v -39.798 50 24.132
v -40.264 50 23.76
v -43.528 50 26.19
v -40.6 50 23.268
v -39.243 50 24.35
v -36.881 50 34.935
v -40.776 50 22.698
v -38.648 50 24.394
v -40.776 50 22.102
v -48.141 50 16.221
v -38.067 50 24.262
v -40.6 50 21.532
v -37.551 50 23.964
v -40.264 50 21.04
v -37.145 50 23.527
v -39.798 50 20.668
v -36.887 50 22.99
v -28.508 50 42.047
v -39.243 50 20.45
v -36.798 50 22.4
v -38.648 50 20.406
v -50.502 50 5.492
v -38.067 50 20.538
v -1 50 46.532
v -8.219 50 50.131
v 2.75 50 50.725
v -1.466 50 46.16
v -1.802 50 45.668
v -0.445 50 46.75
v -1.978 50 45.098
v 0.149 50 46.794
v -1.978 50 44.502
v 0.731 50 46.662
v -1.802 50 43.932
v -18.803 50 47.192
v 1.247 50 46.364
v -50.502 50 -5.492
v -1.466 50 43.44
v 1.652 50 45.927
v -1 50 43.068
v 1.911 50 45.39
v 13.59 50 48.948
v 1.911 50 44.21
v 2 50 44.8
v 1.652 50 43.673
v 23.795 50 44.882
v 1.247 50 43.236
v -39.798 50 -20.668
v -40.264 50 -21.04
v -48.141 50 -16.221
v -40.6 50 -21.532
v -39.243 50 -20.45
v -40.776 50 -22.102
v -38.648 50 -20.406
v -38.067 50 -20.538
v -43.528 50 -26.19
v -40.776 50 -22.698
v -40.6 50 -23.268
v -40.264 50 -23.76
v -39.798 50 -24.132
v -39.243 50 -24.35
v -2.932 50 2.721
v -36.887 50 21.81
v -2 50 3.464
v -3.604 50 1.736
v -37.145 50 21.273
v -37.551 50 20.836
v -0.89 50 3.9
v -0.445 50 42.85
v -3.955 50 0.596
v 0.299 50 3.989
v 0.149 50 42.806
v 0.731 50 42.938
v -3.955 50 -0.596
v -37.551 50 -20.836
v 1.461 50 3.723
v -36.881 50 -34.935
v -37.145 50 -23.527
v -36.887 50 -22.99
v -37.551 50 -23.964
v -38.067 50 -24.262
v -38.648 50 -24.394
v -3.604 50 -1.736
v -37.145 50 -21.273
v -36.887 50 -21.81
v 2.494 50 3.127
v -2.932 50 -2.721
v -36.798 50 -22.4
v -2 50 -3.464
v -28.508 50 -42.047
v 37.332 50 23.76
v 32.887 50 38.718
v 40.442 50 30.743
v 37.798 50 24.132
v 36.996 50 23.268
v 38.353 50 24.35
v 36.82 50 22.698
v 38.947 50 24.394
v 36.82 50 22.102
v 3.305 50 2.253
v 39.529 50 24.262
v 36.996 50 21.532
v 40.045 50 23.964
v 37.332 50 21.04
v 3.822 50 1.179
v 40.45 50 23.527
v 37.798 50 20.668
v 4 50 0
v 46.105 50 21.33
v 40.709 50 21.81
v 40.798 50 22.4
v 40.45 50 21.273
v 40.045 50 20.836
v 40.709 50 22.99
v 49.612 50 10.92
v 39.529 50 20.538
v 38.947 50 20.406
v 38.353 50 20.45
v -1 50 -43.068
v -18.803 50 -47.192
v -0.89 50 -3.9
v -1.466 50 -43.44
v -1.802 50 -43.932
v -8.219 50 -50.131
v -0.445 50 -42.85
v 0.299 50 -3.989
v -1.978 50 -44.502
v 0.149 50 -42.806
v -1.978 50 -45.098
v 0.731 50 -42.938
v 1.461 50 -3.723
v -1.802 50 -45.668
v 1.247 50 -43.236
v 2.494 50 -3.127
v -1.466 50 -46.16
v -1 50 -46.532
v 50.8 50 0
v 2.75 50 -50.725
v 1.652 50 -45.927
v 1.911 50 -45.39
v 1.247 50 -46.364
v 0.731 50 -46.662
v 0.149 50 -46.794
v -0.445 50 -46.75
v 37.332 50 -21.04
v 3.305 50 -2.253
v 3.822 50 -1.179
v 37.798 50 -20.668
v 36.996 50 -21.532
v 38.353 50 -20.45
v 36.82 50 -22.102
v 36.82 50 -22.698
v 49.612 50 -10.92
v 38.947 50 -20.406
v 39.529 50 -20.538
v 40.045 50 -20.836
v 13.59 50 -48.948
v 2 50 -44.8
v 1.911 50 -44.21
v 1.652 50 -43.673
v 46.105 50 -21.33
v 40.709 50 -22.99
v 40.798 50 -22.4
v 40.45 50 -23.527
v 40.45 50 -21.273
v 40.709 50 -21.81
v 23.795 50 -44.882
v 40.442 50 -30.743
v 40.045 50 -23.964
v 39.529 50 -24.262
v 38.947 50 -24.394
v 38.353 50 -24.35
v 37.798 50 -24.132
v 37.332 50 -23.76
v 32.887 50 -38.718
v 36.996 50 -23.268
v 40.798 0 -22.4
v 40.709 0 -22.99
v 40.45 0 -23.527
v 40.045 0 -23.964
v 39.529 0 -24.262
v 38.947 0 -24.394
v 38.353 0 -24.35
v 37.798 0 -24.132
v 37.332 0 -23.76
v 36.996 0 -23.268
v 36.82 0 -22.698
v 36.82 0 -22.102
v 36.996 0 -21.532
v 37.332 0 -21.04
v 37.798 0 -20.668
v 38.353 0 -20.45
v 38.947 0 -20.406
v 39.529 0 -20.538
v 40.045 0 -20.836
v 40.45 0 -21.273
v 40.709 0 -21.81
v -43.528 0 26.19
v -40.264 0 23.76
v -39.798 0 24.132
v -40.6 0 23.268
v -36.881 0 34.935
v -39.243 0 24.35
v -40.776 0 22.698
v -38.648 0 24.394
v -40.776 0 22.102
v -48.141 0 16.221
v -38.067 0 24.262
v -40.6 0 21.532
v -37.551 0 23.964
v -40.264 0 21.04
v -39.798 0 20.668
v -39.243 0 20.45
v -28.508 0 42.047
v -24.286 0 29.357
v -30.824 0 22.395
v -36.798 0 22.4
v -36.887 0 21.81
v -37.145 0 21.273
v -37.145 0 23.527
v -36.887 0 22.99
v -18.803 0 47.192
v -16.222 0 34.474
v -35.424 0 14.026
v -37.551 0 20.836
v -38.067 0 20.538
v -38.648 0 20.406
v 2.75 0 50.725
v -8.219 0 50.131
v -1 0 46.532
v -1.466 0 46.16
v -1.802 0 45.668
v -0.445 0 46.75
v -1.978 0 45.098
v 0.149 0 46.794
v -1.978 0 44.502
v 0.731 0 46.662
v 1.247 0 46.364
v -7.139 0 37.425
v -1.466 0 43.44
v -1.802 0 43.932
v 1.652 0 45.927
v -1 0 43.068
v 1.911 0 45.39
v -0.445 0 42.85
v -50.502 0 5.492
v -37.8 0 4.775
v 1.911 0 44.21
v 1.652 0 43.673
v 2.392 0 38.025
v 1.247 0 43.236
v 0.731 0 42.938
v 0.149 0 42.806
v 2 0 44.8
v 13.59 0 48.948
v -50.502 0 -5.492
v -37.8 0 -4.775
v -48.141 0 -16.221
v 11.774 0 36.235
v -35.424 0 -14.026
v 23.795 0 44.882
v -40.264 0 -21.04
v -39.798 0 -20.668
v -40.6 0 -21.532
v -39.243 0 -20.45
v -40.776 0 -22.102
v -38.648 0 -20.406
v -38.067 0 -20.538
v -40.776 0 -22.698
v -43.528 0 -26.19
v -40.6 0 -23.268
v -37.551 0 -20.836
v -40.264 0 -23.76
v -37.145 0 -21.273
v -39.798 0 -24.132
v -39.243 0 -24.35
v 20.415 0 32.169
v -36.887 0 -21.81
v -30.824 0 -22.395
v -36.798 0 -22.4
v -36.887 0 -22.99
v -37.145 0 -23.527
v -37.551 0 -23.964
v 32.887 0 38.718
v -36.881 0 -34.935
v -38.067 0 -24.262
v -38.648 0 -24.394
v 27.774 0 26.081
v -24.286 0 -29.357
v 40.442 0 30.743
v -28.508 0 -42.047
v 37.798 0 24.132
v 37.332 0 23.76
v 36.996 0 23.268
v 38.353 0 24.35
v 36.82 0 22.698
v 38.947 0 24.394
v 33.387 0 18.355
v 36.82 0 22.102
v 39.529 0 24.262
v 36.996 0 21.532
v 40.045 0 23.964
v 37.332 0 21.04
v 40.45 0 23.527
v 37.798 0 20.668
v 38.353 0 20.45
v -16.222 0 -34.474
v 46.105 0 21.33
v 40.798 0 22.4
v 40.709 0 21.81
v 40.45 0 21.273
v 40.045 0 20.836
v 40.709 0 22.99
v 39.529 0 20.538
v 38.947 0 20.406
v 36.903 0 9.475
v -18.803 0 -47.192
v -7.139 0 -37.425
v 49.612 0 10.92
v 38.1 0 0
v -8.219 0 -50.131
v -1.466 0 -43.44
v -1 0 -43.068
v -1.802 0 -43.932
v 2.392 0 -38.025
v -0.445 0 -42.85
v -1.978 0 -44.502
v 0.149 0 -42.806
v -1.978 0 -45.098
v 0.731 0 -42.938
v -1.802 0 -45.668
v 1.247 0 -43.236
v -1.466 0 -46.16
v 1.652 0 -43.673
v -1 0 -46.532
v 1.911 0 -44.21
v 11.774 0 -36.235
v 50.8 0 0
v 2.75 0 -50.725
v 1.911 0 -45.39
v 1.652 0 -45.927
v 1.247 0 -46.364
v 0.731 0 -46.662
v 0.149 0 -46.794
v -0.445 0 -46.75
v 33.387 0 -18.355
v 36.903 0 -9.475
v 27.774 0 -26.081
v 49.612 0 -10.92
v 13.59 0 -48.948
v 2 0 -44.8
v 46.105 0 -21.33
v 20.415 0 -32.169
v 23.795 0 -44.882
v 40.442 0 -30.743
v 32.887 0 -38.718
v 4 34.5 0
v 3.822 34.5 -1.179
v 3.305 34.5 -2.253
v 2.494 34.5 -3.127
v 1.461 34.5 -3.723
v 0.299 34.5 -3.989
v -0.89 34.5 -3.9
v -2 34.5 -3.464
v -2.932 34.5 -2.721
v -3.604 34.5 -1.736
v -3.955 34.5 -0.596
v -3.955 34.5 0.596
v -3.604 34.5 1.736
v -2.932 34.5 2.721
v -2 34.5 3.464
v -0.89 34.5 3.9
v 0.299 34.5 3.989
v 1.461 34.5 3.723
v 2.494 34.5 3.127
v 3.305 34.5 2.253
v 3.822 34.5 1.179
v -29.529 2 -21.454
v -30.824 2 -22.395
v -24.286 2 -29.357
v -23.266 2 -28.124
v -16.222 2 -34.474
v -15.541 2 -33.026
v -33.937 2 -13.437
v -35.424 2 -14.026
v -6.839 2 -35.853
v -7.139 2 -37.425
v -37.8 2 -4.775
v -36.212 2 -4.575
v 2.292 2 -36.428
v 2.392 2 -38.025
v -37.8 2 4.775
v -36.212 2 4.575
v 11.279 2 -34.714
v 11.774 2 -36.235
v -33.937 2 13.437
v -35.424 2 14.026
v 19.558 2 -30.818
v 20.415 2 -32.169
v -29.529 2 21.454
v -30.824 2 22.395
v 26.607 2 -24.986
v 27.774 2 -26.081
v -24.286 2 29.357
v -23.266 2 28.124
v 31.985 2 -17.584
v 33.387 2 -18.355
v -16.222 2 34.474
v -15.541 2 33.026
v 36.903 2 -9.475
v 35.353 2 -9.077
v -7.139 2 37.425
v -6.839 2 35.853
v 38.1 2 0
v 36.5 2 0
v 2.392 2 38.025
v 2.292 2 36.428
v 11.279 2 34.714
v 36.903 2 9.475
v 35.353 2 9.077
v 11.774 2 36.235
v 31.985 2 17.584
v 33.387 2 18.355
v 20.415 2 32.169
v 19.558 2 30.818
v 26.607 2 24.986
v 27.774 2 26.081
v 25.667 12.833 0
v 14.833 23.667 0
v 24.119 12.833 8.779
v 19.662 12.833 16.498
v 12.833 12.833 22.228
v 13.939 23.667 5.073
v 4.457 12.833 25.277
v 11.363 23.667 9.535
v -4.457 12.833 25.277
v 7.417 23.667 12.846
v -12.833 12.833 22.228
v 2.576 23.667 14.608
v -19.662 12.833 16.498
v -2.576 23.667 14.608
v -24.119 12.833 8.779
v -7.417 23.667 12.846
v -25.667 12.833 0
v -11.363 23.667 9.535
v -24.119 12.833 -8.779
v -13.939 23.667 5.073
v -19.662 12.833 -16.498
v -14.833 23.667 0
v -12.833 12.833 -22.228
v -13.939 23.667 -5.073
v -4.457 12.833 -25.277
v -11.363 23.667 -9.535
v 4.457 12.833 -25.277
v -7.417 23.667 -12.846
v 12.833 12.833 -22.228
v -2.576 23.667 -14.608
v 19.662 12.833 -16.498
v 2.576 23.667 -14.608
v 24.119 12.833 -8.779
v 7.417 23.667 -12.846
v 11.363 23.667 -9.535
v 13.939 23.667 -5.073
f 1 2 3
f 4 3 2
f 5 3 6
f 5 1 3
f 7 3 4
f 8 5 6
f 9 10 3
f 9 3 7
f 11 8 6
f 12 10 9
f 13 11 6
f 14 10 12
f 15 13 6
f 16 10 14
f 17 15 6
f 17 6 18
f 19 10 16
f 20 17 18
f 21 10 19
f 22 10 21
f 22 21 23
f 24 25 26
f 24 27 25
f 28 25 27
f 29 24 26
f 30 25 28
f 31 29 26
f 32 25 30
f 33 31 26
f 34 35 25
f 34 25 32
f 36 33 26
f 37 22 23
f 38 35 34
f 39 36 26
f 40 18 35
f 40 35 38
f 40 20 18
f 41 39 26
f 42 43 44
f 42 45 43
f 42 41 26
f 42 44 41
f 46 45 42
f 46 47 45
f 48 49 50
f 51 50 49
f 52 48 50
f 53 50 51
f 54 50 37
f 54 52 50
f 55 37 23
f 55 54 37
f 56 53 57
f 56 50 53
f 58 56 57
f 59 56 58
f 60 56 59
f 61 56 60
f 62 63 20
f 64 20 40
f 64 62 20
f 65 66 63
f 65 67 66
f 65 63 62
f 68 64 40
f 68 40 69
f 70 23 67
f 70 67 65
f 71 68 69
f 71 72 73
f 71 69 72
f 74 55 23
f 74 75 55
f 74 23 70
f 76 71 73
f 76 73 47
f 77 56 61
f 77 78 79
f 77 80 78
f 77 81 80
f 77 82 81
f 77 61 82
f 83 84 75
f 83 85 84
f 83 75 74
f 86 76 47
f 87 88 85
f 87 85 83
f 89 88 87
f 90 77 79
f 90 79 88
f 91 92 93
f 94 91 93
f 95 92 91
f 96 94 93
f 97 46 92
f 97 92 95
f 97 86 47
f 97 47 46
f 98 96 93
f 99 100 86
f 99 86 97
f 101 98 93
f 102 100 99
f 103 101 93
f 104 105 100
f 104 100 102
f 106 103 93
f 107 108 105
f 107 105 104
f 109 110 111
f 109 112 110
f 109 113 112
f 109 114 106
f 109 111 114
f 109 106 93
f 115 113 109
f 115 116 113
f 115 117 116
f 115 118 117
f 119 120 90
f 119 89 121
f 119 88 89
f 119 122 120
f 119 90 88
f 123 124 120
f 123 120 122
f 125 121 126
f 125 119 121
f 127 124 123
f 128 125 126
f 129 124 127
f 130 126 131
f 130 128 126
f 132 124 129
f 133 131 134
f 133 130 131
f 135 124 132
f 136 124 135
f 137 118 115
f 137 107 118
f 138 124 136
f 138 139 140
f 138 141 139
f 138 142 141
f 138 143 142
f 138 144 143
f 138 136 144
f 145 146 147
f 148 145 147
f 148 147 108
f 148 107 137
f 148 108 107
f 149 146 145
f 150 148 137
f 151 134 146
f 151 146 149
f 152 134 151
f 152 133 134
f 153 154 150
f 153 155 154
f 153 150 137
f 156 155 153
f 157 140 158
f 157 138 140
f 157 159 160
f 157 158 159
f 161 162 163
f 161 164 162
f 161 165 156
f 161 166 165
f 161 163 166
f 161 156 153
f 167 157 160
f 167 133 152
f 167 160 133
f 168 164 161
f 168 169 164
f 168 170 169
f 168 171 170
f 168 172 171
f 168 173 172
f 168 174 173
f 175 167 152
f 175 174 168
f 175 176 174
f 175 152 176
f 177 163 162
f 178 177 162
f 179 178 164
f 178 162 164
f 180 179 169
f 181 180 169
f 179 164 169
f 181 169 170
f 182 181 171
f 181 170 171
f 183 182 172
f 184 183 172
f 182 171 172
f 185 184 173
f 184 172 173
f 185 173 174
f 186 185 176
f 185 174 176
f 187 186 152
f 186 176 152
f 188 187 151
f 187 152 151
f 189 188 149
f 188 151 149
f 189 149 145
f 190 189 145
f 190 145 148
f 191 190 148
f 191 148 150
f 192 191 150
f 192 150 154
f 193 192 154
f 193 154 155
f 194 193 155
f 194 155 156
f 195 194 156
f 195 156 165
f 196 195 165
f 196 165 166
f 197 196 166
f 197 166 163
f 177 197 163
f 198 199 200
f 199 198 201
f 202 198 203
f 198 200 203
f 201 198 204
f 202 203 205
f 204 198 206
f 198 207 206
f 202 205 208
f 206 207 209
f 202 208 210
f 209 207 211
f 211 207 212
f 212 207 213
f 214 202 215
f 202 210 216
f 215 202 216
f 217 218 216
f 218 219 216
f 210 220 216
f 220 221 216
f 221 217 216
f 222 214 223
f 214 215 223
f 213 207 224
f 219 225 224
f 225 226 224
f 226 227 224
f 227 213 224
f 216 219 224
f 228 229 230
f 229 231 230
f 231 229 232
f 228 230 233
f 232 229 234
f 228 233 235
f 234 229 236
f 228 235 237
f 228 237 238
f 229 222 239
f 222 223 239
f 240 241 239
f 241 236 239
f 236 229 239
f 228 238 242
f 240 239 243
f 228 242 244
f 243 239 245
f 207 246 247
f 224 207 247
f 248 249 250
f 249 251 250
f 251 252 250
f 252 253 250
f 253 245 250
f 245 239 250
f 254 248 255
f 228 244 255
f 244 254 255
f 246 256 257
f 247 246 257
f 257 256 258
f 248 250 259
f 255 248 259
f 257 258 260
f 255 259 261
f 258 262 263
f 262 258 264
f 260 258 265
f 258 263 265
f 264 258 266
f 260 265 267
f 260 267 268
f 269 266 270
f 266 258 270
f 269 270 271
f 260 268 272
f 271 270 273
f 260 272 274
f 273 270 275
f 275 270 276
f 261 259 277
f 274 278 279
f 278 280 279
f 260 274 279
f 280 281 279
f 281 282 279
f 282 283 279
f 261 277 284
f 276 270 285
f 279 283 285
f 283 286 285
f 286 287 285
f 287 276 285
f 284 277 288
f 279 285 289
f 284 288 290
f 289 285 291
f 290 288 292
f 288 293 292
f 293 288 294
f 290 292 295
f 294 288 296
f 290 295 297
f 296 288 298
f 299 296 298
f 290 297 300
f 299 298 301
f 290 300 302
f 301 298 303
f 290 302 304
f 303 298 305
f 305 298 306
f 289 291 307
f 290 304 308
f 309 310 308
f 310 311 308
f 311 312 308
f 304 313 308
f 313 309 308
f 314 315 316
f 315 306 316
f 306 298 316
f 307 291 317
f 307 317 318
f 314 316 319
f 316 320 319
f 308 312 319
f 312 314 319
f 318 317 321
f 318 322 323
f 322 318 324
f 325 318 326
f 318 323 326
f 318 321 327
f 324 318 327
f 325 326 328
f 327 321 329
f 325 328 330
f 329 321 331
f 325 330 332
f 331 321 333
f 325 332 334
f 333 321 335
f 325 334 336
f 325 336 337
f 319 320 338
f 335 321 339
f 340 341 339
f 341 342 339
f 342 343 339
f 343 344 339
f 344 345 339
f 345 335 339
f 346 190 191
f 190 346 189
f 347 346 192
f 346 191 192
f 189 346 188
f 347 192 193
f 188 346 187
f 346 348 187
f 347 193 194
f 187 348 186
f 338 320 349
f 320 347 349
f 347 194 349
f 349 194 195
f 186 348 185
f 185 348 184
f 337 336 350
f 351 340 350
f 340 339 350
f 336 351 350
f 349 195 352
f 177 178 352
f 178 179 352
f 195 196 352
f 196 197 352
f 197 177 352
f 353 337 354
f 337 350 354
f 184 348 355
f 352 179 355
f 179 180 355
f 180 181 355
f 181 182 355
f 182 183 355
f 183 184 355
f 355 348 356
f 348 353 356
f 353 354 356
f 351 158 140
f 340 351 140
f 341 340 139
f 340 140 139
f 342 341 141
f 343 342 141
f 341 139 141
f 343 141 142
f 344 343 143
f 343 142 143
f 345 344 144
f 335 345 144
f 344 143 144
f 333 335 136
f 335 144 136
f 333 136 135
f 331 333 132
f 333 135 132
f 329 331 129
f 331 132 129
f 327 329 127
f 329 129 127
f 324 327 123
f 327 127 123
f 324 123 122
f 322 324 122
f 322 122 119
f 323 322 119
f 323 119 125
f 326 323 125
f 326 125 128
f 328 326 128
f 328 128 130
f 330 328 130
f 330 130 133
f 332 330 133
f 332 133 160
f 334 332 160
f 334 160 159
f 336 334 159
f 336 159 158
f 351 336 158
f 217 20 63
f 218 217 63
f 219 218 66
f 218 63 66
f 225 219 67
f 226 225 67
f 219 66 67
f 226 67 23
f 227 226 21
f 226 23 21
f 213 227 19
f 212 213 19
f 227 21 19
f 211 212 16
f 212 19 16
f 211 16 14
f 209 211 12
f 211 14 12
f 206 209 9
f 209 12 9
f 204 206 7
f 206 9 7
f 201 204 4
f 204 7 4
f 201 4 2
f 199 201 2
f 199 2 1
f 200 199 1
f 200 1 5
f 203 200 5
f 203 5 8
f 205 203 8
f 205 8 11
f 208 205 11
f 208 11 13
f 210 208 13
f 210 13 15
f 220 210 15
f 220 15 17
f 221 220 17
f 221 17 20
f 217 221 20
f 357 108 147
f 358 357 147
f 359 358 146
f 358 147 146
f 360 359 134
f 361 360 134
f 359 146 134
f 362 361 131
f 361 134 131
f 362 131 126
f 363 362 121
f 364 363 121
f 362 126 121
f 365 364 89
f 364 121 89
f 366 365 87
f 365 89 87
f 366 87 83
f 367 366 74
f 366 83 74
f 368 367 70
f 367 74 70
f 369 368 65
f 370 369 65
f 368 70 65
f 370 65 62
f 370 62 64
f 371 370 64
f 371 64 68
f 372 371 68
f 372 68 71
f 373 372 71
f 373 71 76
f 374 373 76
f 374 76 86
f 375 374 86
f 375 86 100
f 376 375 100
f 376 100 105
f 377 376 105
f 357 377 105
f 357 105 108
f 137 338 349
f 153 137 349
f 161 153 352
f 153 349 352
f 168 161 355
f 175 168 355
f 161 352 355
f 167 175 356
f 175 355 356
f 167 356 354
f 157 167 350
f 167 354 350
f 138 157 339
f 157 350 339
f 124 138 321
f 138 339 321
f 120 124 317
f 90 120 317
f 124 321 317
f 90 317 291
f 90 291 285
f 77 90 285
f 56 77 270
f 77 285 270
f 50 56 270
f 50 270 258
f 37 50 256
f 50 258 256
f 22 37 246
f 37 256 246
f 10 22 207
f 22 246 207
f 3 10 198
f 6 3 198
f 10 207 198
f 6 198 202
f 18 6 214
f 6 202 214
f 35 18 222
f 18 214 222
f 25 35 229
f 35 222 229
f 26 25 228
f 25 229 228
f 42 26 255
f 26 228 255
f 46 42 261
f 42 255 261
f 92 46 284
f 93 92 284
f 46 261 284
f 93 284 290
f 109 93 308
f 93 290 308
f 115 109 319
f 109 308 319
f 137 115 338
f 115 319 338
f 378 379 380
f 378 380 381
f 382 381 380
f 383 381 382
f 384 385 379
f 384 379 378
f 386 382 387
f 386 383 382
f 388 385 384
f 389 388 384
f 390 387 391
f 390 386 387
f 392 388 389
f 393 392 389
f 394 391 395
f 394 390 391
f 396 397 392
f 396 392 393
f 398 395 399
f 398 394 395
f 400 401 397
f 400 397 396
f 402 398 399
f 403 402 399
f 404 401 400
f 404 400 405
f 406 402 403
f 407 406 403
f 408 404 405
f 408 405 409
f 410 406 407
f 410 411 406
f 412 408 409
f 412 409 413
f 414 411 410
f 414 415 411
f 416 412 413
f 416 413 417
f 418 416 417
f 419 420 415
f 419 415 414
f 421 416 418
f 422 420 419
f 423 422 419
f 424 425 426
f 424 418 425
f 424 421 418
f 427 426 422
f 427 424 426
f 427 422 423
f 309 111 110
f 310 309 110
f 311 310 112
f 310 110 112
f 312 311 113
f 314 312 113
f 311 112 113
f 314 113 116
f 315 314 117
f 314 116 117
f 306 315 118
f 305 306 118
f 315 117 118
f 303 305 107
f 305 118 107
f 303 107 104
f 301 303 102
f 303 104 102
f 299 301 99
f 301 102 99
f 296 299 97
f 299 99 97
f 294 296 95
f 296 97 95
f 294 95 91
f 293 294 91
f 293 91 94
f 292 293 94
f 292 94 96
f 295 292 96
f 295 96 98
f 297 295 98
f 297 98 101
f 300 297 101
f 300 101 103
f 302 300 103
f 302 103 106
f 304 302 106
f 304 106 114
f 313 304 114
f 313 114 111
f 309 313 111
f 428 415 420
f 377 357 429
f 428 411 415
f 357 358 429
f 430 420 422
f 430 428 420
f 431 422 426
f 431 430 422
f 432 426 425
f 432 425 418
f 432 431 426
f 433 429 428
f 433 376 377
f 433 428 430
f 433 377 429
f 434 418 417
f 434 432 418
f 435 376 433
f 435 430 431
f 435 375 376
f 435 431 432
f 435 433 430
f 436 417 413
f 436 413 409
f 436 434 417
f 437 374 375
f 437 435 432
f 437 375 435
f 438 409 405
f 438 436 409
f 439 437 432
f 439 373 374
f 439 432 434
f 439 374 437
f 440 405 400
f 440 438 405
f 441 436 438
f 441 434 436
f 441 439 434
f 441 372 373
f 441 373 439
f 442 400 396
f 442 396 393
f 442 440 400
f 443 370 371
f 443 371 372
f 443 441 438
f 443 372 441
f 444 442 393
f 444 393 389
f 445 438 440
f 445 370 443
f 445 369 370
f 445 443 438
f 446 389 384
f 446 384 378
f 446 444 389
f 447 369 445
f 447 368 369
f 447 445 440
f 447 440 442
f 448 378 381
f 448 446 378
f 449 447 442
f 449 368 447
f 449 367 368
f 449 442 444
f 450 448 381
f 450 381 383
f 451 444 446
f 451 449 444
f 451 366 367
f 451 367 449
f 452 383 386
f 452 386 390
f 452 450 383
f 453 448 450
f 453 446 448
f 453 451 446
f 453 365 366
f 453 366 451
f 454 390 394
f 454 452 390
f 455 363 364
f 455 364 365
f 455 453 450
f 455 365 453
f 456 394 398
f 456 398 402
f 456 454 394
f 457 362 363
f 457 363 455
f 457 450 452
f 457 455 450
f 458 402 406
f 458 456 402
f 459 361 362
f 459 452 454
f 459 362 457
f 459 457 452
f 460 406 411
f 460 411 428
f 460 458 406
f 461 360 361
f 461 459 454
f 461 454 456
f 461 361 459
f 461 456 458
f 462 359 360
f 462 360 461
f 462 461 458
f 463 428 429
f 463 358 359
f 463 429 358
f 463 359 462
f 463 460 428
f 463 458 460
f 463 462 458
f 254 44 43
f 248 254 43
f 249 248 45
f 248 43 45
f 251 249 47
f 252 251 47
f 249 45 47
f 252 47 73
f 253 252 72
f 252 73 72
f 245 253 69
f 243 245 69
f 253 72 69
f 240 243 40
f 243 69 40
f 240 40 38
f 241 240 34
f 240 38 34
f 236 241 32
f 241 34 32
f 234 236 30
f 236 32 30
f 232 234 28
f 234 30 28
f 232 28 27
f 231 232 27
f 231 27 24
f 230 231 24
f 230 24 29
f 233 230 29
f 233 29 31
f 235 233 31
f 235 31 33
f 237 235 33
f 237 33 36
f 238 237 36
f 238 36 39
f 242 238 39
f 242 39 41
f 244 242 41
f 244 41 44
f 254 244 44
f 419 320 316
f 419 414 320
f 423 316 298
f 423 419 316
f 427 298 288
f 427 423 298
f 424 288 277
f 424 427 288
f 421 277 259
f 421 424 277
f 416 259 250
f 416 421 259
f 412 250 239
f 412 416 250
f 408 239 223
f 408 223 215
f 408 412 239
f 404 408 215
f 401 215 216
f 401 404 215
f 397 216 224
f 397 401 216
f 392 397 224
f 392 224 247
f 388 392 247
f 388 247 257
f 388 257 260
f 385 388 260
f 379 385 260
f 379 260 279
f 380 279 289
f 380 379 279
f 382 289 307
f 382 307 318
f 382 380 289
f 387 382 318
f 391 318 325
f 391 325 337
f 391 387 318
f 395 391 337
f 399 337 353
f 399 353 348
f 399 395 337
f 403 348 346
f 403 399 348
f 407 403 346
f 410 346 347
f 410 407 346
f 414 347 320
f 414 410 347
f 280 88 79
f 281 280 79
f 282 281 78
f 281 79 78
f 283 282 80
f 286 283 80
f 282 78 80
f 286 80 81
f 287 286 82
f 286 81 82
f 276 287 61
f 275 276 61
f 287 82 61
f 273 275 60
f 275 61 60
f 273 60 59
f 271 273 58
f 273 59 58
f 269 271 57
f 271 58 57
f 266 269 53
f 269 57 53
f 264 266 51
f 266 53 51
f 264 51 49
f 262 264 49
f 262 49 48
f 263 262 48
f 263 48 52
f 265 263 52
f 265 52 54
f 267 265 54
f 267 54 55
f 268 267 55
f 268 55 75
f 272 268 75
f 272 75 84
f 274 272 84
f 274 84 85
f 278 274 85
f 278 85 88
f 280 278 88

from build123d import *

# Parameters (mm, degrees)
SKETCH1_R           = 50.8
BOSS_EXTRUDE1_DEPTH = 50
SKETCH4_R           = 4
SKETCH4_R_2         = 2
CUT_EXTRUDE2_DEPTH  = 71


with BuildPart() as part:
    # Sketch1 → Boss-Extrude1 (new body)
    with BuildSketch(Plane(origin=(0, 0, 0), x_dir=(1, 0, 0), z_dir=(0, 1, 0))):
        Circle(SKETCH1_R)
    extrude(amount=BOSS_EXTRUDE1_DEPTH)

    # Sketch3 → Cut-Revolve1 (revolve, cut)
    with BuildSketch(Plane.XY):
        Polygon((0, 0), (38.1, 0), (38.1, 2), (36.5, 2), (0, 38.5), align=None)
    revolve(axis=Axis((0, 38.5, 0), (0, -1, 0)), mode=Mode.SUBTRACT)

    # Sketch4 → Cut-Extrude2 (cut)
    with BuildSketch(Plane(origin=(0, 50, 0), x_dir=(1, 0, 0), z_dir=(0, 1, 0))):
        Circle(SKETCH4_R)
        with Locations((0, 44.8)):
            Circle(SKETCH4_R_2)
        with Locations((38.79793809, 22.4)):
            Circle(SKETCH4_R_2)
        with Locations((38.79793809, -22.4)):
            Circle(SKETCH4_R_2)
        with Locations((0, -44.8)):
            Circle(SKETCH4_R_2)
        with Locations((-38.79793809, -22.4)):
            Circle(SKETCH4_R_2)
        with Locations((-38.79793809, 22.4)):
            Circle(SKETCH4_R_2)
    extrude(amount=-CUT_EXTRUDE2_DEPTH, mode=Mode.SUBTRACT)


solid = part.part
